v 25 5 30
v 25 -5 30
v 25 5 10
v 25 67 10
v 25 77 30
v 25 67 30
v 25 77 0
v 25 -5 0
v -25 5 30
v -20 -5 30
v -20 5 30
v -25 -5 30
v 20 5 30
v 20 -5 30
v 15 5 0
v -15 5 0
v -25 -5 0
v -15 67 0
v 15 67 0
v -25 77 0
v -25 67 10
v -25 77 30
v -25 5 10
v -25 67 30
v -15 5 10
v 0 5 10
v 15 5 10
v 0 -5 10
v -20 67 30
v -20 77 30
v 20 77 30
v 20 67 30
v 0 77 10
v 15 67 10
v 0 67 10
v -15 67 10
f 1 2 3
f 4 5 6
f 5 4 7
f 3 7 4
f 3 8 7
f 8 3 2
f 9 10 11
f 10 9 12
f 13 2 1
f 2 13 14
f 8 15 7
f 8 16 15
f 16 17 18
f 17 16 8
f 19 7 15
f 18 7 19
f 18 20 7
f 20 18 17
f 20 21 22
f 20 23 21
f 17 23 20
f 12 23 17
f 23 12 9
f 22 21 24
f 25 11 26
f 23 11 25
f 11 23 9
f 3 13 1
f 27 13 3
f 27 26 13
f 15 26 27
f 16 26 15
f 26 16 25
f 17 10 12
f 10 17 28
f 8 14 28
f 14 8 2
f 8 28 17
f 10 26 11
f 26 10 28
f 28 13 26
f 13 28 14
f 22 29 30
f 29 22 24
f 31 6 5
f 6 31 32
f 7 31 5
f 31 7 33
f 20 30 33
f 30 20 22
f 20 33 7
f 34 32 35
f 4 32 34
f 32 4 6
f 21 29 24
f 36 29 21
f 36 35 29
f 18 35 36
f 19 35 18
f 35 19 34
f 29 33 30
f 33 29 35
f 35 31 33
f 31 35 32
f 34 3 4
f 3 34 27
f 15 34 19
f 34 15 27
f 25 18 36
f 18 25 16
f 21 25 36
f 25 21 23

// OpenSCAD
// v block for collimating laser collimator


OA = 82; // out-to-out of blocks
Y = 10; // height from point of V to base

H = 30;  // overall height of v block
W = 50;  // overall width of v block
L = 10;  // thickness of one v block
C = 10; // stretcher dimension
S = OA - L - L; // clear spacing between blocks

notch = 80.0 * sqrt(0.5);

union() {
	vblock(Y);
	translate( [0.5*W-10,0.5*L,0] )
		cube ( [C, S, C] );
	translate( [-0.5*W,0.5*L,0] )
		cube ( [C, S, C] );
	translate( [0,L+S,0 ] )
		vblock(Y);
}

module vblock( hV ) { // hV is height of notch above base
	difference() {
		translate( [-0.5*W, -0.5*L, 0] )
			cube ( [ W, L, H ] );
		translate( [ 0,-0.5*L, hV ] )
			rotate( [0,-45,0] )
				cube( [notch,L,notch] );
	}
}
